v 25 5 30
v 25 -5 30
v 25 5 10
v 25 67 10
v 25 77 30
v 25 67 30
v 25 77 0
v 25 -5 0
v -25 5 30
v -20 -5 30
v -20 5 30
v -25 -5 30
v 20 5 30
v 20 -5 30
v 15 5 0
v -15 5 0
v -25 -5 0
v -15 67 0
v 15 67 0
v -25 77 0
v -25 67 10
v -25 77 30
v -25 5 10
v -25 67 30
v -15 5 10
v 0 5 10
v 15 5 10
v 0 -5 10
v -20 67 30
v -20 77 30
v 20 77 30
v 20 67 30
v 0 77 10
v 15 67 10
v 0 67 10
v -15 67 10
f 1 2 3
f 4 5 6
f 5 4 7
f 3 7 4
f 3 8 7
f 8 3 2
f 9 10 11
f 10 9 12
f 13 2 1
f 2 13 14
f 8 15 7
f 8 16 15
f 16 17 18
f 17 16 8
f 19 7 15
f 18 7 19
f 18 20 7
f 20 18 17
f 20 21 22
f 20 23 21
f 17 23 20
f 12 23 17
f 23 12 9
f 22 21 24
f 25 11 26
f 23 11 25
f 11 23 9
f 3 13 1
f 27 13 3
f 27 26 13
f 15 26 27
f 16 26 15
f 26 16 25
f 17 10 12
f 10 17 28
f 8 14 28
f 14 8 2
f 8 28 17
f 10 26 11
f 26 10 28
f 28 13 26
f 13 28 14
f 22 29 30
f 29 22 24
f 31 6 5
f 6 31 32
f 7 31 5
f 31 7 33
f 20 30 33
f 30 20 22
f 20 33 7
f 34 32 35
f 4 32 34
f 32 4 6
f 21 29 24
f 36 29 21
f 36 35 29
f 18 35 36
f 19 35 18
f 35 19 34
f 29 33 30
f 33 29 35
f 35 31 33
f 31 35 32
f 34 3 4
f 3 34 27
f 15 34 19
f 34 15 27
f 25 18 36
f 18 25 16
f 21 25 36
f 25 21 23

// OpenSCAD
// v block for collimating laser collimator


OA = 82; // out-to-out of blocks
Y = 10; // height from point of V to base

H = 30;  // overall height of v block
W = 50;  // overall width of v block
L = 10;  // thickness of one v block
C = 10; // stretcher dimension
S = OA - L - L; // clear spacing between blocks

notch = 80.0 * sqrt(0.5);

union() {
	vblock(Y);
	translate( [0.5*W-10,0.5*L,0] )
		cube ( [C, S, C] );
	translate( [-0.5*W,0.5*L,0] )
		cube ( [C, S, C] );
	translate( [0,L+S,0 ] )
		vblock(Y);
}

module vblock( hV ) { // hV is height of notch above base
	difference() {
		translate( [-0.5*W, -0.5*L, 0] )
			cube ( [ W, L, H ] );
		translate( [ 0,-0.5*L, hV ] )
			rotate( [0,-45,0] )
				cube( [notch,L,notch] );
	}
}
